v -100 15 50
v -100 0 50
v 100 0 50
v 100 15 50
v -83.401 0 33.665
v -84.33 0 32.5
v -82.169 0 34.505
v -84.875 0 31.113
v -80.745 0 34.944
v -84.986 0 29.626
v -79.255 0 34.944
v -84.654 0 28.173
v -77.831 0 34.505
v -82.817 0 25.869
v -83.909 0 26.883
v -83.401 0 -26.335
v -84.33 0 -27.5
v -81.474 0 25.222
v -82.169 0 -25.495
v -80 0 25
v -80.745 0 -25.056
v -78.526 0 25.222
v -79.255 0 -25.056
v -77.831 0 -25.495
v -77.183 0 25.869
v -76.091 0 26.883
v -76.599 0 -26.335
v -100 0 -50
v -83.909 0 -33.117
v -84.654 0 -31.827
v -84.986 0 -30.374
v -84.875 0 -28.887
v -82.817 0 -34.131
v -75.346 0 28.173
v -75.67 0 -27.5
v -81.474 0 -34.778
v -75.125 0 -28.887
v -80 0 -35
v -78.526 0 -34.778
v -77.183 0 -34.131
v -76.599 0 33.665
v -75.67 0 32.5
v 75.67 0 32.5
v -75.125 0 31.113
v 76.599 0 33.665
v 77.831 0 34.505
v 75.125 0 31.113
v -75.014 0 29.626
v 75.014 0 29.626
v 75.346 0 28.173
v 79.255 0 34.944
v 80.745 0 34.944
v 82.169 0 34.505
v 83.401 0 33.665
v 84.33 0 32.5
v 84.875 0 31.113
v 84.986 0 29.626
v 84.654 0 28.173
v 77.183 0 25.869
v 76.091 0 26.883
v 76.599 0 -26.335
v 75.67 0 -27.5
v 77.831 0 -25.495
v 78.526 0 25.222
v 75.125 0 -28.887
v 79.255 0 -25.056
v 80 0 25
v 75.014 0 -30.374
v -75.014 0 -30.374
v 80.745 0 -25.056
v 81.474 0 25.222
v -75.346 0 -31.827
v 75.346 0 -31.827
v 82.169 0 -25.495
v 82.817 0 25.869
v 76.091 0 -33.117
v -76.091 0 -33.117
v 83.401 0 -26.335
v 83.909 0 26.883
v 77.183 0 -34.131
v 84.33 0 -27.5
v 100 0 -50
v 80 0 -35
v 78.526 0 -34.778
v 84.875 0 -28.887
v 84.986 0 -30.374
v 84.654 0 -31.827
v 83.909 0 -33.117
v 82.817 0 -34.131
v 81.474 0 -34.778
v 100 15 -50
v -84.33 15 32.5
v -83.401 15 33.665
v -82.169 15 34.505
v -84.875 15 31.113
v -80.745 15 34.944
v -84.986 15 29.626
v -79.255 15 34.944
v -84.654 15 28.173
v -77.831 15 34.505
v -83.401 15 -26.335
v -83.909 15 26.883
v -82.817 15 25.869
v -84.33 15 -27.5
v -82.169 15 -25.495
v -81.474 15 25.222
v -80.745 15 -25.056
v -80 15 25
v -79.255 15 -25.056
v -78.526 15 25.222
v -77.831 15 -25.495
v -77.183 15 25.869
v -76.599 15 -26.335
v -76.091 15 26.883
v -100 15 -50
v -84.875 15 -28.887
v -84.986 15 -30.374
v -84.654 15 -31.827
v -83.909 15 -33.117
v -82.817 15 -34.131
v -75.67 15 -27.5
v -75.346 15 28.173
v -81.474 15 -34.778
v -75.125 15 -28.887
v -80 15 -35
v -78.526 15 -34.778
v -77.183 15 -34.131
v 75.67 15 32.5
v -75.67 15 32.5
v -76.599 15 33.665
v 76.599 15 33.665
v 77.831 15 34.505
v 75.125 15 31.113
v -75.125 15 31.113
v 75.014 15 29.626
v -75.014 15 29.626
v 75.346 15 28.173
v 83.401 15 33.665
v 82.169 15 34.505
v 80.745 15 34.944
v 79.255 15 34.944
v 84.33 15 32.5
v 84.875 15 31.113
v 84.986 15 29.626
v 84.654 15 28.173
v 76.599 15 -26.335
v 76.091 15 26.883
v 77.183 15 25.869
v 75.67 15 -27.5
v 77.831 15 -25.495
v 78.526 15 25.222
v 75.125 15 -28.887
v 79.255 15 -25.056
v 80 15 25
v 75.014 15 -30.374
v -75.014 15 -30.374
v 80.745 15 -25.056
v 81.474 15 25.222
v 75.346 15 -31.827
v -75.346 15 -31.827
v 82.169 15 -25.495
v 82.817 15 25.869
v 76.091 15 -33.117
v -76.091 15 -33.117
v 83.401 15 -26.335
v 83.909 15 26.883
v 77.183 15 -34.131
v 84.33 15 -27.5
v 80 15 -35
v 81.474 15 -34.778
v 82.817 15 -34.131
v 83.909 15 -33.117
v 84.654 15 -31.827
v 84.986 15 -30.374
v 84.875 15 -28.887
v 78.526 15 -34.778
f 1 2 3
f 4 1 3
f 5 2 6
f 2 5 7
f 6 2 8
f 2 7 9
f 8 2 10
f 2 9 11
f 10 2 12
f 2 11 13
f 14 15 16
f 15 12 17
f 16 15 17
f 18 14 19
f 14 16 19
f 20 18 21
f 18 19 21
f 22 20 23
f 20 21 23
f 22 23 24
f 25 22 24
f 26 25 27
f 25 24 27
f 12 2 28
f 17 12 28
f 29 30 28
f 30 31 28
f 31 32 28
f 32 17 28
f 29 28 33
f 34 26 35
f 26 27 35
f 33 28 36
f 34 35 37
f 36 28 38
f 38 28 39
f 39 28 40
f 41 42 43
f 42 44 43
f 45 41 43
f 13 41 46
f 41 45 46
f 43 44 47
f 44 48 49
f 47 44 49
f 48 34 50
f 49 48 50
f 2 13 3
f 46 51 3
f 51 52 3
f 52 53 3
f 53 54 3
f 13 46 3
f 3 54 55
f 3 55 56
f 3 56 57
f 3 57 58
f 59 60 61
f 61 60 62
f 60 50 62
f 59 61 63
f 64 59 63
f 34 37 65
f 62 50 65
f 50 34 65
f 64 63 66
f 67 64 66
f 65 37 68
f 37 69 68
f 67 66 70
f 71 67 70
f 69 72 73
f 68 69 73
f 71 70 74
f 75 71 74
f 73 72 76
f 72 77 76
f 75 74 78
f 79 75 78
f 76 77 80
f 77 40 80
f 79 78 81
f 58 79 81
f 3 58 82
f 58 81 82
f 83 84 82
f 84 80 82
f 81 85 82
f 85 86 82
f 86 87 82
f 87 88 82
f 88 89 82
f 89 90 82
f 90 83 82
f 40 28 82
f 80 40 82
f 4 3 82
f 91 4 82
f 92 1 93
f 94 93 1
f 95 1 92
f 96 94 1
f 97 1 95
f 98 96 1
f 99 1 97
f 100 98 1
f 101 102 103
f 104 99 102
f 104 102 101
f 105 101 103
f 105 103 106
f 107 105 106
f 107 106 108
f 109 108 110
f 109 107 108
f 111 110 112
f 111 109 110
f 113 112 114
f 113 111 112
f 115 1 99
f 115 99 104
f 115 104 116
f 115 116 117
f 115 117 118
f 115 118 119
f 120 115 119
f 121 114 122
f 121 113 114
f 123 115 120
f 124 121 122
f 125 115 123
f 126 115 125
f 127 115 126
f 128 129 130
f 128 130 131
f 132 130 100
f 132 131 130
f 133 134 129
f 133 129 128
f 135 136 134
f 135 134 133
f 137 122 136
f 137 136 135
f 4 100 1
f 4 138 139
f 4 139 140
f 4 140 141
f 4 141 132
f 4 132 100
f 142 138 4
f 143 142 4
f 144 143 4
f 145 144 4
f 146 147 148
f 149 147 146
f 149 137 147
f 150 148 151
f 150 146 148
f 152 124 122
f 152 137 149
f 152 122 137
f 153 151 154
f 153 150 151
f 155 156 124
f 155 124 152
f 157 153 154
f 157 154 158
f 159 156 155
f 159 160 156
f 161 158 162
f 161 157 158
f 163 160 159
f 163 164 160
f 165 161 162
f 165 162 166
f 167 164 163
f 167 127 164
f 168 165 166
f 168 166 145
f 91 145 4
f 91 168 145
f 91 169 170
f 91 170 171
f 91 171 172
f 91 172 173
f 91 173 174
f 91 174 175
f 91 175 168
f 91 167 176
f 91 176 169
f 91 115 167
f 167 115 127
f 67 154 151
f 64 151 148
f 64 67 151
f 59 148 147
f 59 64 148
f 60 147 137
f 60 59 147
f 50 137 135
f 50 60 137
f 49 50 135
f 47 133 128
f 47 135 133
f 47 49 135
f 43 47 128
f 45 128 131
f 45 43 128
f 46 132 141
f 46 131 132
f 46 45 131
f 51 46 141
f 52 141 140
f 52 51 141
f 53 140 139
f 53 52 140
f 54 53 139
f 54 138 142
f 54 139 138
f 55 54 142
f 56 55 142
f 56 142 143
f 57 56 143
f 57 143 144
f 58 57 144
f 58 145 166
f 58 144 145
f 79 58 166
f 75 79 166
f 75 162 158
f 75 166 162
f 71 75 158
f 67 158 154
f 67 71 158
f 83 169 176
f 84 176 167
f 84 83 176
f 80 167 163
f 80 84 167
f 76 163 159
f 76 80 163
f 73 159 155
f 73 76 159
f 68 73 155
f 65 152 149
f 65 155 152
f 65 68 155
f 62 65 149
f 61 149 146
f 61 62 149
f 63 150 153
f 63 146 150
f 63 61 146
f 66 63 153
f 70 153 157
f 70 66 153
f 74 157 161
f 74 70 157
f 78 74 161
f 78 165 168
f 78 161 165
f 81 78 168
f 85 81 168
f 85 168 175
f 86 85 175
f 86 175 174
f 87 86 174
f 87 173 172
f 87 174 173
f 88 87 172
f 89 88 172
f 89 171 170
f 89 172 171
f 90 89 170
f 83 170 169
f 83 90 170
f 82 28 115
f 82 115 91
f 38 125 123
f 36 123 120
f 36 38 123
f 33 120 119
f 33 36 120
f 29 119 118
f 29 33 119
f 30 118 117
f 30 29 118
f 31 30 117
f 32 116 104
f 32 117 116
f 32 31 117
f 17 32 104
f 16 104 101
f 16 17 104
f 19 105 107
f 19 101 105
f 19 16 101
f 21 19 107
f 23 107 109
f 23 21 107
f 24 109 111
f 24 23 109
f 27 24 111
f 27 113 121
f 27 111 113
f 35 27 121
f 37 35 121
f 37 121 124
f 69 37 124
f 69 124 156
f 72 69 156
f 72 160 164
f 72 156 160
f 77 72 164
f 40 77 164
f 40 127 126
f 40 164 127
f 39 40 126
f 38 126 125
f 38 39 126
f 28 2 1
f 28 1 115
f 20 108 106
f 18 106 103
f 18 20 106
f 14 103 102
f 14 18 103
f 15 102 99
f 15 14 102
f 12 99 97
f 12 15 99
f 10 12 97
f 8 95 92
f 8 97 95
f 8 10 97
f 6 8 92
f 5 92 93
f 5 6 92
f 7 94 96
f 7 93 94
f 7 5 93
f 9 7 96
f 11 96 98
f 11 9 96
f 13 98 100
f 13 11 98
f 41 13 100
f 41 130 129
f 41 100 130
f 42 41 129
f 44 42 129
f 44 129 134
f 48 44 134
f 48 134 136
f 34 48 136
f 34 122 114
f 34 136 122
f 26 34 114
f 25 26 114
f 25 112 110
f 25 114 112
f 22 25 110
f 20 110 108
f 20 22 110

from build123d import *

# Parameters (mm, degrees)
SKETCH_1_W          = 200
SKETCH_1_H          = 100
EXTRUDE_1_DEPTH     = 15
SKETCH_2_R          = 5
CUT_EXTRUDE_1_DEPTH = 30
SKETCH_3_R          = 5
CUT_EXTRUDE_2_DEPTH = 30


with BuildPart() as part:
    # 草图1 → 凸台-拉伸1 (new body)
    with BuildSketch(Plane(origin=(0, 0, 0), x_dir=(1, 0, 0), z_dir=(0, 1, 0))):
        Rectangle(SKETCH_1_W, SKETCH_1_H)
    extrude(amount=EXTRUDE_1_DEPTH)

    # 草图2 → 切除-拉伸1 (cut)
    with BuildSketch(Plane(origin=(0, 0, 0), x_dir=(1, 0, 0), z_dir=(0, 1, 0))):
        with Locations(Location((-80, -30, 0), (0, 0, 90))):
            Circle(SKETCH_2_R)
        with Locations(Location((80, -30, 0), (0, 0, 90))):
            Circle(SKETCH_2_R)
        with Locations(Location((-80, 30, 0), (0, 0, 90))):
            Circle(SKETCH_2_R)
    extrude(amount=CUT_EXTRUDE_1_DEPTH, mode=Mode.SUBTRACT)

    # 草图3 → 切除-拉伸2 (cut)
    with BuildSketch(Plane(origin=(0, 0, 0), x_dir=(1, 0, 0), z_dir=(0, 1, 0))):
        with Locations(Location((80, 30, 0), (0, 0, 90))):
            Circle(SKETCH_3_R)
    extrude(amount=CUT_EXTRUDE_2_DEPTH, mode=Mode.SUBTRACT)


solid = part.part
